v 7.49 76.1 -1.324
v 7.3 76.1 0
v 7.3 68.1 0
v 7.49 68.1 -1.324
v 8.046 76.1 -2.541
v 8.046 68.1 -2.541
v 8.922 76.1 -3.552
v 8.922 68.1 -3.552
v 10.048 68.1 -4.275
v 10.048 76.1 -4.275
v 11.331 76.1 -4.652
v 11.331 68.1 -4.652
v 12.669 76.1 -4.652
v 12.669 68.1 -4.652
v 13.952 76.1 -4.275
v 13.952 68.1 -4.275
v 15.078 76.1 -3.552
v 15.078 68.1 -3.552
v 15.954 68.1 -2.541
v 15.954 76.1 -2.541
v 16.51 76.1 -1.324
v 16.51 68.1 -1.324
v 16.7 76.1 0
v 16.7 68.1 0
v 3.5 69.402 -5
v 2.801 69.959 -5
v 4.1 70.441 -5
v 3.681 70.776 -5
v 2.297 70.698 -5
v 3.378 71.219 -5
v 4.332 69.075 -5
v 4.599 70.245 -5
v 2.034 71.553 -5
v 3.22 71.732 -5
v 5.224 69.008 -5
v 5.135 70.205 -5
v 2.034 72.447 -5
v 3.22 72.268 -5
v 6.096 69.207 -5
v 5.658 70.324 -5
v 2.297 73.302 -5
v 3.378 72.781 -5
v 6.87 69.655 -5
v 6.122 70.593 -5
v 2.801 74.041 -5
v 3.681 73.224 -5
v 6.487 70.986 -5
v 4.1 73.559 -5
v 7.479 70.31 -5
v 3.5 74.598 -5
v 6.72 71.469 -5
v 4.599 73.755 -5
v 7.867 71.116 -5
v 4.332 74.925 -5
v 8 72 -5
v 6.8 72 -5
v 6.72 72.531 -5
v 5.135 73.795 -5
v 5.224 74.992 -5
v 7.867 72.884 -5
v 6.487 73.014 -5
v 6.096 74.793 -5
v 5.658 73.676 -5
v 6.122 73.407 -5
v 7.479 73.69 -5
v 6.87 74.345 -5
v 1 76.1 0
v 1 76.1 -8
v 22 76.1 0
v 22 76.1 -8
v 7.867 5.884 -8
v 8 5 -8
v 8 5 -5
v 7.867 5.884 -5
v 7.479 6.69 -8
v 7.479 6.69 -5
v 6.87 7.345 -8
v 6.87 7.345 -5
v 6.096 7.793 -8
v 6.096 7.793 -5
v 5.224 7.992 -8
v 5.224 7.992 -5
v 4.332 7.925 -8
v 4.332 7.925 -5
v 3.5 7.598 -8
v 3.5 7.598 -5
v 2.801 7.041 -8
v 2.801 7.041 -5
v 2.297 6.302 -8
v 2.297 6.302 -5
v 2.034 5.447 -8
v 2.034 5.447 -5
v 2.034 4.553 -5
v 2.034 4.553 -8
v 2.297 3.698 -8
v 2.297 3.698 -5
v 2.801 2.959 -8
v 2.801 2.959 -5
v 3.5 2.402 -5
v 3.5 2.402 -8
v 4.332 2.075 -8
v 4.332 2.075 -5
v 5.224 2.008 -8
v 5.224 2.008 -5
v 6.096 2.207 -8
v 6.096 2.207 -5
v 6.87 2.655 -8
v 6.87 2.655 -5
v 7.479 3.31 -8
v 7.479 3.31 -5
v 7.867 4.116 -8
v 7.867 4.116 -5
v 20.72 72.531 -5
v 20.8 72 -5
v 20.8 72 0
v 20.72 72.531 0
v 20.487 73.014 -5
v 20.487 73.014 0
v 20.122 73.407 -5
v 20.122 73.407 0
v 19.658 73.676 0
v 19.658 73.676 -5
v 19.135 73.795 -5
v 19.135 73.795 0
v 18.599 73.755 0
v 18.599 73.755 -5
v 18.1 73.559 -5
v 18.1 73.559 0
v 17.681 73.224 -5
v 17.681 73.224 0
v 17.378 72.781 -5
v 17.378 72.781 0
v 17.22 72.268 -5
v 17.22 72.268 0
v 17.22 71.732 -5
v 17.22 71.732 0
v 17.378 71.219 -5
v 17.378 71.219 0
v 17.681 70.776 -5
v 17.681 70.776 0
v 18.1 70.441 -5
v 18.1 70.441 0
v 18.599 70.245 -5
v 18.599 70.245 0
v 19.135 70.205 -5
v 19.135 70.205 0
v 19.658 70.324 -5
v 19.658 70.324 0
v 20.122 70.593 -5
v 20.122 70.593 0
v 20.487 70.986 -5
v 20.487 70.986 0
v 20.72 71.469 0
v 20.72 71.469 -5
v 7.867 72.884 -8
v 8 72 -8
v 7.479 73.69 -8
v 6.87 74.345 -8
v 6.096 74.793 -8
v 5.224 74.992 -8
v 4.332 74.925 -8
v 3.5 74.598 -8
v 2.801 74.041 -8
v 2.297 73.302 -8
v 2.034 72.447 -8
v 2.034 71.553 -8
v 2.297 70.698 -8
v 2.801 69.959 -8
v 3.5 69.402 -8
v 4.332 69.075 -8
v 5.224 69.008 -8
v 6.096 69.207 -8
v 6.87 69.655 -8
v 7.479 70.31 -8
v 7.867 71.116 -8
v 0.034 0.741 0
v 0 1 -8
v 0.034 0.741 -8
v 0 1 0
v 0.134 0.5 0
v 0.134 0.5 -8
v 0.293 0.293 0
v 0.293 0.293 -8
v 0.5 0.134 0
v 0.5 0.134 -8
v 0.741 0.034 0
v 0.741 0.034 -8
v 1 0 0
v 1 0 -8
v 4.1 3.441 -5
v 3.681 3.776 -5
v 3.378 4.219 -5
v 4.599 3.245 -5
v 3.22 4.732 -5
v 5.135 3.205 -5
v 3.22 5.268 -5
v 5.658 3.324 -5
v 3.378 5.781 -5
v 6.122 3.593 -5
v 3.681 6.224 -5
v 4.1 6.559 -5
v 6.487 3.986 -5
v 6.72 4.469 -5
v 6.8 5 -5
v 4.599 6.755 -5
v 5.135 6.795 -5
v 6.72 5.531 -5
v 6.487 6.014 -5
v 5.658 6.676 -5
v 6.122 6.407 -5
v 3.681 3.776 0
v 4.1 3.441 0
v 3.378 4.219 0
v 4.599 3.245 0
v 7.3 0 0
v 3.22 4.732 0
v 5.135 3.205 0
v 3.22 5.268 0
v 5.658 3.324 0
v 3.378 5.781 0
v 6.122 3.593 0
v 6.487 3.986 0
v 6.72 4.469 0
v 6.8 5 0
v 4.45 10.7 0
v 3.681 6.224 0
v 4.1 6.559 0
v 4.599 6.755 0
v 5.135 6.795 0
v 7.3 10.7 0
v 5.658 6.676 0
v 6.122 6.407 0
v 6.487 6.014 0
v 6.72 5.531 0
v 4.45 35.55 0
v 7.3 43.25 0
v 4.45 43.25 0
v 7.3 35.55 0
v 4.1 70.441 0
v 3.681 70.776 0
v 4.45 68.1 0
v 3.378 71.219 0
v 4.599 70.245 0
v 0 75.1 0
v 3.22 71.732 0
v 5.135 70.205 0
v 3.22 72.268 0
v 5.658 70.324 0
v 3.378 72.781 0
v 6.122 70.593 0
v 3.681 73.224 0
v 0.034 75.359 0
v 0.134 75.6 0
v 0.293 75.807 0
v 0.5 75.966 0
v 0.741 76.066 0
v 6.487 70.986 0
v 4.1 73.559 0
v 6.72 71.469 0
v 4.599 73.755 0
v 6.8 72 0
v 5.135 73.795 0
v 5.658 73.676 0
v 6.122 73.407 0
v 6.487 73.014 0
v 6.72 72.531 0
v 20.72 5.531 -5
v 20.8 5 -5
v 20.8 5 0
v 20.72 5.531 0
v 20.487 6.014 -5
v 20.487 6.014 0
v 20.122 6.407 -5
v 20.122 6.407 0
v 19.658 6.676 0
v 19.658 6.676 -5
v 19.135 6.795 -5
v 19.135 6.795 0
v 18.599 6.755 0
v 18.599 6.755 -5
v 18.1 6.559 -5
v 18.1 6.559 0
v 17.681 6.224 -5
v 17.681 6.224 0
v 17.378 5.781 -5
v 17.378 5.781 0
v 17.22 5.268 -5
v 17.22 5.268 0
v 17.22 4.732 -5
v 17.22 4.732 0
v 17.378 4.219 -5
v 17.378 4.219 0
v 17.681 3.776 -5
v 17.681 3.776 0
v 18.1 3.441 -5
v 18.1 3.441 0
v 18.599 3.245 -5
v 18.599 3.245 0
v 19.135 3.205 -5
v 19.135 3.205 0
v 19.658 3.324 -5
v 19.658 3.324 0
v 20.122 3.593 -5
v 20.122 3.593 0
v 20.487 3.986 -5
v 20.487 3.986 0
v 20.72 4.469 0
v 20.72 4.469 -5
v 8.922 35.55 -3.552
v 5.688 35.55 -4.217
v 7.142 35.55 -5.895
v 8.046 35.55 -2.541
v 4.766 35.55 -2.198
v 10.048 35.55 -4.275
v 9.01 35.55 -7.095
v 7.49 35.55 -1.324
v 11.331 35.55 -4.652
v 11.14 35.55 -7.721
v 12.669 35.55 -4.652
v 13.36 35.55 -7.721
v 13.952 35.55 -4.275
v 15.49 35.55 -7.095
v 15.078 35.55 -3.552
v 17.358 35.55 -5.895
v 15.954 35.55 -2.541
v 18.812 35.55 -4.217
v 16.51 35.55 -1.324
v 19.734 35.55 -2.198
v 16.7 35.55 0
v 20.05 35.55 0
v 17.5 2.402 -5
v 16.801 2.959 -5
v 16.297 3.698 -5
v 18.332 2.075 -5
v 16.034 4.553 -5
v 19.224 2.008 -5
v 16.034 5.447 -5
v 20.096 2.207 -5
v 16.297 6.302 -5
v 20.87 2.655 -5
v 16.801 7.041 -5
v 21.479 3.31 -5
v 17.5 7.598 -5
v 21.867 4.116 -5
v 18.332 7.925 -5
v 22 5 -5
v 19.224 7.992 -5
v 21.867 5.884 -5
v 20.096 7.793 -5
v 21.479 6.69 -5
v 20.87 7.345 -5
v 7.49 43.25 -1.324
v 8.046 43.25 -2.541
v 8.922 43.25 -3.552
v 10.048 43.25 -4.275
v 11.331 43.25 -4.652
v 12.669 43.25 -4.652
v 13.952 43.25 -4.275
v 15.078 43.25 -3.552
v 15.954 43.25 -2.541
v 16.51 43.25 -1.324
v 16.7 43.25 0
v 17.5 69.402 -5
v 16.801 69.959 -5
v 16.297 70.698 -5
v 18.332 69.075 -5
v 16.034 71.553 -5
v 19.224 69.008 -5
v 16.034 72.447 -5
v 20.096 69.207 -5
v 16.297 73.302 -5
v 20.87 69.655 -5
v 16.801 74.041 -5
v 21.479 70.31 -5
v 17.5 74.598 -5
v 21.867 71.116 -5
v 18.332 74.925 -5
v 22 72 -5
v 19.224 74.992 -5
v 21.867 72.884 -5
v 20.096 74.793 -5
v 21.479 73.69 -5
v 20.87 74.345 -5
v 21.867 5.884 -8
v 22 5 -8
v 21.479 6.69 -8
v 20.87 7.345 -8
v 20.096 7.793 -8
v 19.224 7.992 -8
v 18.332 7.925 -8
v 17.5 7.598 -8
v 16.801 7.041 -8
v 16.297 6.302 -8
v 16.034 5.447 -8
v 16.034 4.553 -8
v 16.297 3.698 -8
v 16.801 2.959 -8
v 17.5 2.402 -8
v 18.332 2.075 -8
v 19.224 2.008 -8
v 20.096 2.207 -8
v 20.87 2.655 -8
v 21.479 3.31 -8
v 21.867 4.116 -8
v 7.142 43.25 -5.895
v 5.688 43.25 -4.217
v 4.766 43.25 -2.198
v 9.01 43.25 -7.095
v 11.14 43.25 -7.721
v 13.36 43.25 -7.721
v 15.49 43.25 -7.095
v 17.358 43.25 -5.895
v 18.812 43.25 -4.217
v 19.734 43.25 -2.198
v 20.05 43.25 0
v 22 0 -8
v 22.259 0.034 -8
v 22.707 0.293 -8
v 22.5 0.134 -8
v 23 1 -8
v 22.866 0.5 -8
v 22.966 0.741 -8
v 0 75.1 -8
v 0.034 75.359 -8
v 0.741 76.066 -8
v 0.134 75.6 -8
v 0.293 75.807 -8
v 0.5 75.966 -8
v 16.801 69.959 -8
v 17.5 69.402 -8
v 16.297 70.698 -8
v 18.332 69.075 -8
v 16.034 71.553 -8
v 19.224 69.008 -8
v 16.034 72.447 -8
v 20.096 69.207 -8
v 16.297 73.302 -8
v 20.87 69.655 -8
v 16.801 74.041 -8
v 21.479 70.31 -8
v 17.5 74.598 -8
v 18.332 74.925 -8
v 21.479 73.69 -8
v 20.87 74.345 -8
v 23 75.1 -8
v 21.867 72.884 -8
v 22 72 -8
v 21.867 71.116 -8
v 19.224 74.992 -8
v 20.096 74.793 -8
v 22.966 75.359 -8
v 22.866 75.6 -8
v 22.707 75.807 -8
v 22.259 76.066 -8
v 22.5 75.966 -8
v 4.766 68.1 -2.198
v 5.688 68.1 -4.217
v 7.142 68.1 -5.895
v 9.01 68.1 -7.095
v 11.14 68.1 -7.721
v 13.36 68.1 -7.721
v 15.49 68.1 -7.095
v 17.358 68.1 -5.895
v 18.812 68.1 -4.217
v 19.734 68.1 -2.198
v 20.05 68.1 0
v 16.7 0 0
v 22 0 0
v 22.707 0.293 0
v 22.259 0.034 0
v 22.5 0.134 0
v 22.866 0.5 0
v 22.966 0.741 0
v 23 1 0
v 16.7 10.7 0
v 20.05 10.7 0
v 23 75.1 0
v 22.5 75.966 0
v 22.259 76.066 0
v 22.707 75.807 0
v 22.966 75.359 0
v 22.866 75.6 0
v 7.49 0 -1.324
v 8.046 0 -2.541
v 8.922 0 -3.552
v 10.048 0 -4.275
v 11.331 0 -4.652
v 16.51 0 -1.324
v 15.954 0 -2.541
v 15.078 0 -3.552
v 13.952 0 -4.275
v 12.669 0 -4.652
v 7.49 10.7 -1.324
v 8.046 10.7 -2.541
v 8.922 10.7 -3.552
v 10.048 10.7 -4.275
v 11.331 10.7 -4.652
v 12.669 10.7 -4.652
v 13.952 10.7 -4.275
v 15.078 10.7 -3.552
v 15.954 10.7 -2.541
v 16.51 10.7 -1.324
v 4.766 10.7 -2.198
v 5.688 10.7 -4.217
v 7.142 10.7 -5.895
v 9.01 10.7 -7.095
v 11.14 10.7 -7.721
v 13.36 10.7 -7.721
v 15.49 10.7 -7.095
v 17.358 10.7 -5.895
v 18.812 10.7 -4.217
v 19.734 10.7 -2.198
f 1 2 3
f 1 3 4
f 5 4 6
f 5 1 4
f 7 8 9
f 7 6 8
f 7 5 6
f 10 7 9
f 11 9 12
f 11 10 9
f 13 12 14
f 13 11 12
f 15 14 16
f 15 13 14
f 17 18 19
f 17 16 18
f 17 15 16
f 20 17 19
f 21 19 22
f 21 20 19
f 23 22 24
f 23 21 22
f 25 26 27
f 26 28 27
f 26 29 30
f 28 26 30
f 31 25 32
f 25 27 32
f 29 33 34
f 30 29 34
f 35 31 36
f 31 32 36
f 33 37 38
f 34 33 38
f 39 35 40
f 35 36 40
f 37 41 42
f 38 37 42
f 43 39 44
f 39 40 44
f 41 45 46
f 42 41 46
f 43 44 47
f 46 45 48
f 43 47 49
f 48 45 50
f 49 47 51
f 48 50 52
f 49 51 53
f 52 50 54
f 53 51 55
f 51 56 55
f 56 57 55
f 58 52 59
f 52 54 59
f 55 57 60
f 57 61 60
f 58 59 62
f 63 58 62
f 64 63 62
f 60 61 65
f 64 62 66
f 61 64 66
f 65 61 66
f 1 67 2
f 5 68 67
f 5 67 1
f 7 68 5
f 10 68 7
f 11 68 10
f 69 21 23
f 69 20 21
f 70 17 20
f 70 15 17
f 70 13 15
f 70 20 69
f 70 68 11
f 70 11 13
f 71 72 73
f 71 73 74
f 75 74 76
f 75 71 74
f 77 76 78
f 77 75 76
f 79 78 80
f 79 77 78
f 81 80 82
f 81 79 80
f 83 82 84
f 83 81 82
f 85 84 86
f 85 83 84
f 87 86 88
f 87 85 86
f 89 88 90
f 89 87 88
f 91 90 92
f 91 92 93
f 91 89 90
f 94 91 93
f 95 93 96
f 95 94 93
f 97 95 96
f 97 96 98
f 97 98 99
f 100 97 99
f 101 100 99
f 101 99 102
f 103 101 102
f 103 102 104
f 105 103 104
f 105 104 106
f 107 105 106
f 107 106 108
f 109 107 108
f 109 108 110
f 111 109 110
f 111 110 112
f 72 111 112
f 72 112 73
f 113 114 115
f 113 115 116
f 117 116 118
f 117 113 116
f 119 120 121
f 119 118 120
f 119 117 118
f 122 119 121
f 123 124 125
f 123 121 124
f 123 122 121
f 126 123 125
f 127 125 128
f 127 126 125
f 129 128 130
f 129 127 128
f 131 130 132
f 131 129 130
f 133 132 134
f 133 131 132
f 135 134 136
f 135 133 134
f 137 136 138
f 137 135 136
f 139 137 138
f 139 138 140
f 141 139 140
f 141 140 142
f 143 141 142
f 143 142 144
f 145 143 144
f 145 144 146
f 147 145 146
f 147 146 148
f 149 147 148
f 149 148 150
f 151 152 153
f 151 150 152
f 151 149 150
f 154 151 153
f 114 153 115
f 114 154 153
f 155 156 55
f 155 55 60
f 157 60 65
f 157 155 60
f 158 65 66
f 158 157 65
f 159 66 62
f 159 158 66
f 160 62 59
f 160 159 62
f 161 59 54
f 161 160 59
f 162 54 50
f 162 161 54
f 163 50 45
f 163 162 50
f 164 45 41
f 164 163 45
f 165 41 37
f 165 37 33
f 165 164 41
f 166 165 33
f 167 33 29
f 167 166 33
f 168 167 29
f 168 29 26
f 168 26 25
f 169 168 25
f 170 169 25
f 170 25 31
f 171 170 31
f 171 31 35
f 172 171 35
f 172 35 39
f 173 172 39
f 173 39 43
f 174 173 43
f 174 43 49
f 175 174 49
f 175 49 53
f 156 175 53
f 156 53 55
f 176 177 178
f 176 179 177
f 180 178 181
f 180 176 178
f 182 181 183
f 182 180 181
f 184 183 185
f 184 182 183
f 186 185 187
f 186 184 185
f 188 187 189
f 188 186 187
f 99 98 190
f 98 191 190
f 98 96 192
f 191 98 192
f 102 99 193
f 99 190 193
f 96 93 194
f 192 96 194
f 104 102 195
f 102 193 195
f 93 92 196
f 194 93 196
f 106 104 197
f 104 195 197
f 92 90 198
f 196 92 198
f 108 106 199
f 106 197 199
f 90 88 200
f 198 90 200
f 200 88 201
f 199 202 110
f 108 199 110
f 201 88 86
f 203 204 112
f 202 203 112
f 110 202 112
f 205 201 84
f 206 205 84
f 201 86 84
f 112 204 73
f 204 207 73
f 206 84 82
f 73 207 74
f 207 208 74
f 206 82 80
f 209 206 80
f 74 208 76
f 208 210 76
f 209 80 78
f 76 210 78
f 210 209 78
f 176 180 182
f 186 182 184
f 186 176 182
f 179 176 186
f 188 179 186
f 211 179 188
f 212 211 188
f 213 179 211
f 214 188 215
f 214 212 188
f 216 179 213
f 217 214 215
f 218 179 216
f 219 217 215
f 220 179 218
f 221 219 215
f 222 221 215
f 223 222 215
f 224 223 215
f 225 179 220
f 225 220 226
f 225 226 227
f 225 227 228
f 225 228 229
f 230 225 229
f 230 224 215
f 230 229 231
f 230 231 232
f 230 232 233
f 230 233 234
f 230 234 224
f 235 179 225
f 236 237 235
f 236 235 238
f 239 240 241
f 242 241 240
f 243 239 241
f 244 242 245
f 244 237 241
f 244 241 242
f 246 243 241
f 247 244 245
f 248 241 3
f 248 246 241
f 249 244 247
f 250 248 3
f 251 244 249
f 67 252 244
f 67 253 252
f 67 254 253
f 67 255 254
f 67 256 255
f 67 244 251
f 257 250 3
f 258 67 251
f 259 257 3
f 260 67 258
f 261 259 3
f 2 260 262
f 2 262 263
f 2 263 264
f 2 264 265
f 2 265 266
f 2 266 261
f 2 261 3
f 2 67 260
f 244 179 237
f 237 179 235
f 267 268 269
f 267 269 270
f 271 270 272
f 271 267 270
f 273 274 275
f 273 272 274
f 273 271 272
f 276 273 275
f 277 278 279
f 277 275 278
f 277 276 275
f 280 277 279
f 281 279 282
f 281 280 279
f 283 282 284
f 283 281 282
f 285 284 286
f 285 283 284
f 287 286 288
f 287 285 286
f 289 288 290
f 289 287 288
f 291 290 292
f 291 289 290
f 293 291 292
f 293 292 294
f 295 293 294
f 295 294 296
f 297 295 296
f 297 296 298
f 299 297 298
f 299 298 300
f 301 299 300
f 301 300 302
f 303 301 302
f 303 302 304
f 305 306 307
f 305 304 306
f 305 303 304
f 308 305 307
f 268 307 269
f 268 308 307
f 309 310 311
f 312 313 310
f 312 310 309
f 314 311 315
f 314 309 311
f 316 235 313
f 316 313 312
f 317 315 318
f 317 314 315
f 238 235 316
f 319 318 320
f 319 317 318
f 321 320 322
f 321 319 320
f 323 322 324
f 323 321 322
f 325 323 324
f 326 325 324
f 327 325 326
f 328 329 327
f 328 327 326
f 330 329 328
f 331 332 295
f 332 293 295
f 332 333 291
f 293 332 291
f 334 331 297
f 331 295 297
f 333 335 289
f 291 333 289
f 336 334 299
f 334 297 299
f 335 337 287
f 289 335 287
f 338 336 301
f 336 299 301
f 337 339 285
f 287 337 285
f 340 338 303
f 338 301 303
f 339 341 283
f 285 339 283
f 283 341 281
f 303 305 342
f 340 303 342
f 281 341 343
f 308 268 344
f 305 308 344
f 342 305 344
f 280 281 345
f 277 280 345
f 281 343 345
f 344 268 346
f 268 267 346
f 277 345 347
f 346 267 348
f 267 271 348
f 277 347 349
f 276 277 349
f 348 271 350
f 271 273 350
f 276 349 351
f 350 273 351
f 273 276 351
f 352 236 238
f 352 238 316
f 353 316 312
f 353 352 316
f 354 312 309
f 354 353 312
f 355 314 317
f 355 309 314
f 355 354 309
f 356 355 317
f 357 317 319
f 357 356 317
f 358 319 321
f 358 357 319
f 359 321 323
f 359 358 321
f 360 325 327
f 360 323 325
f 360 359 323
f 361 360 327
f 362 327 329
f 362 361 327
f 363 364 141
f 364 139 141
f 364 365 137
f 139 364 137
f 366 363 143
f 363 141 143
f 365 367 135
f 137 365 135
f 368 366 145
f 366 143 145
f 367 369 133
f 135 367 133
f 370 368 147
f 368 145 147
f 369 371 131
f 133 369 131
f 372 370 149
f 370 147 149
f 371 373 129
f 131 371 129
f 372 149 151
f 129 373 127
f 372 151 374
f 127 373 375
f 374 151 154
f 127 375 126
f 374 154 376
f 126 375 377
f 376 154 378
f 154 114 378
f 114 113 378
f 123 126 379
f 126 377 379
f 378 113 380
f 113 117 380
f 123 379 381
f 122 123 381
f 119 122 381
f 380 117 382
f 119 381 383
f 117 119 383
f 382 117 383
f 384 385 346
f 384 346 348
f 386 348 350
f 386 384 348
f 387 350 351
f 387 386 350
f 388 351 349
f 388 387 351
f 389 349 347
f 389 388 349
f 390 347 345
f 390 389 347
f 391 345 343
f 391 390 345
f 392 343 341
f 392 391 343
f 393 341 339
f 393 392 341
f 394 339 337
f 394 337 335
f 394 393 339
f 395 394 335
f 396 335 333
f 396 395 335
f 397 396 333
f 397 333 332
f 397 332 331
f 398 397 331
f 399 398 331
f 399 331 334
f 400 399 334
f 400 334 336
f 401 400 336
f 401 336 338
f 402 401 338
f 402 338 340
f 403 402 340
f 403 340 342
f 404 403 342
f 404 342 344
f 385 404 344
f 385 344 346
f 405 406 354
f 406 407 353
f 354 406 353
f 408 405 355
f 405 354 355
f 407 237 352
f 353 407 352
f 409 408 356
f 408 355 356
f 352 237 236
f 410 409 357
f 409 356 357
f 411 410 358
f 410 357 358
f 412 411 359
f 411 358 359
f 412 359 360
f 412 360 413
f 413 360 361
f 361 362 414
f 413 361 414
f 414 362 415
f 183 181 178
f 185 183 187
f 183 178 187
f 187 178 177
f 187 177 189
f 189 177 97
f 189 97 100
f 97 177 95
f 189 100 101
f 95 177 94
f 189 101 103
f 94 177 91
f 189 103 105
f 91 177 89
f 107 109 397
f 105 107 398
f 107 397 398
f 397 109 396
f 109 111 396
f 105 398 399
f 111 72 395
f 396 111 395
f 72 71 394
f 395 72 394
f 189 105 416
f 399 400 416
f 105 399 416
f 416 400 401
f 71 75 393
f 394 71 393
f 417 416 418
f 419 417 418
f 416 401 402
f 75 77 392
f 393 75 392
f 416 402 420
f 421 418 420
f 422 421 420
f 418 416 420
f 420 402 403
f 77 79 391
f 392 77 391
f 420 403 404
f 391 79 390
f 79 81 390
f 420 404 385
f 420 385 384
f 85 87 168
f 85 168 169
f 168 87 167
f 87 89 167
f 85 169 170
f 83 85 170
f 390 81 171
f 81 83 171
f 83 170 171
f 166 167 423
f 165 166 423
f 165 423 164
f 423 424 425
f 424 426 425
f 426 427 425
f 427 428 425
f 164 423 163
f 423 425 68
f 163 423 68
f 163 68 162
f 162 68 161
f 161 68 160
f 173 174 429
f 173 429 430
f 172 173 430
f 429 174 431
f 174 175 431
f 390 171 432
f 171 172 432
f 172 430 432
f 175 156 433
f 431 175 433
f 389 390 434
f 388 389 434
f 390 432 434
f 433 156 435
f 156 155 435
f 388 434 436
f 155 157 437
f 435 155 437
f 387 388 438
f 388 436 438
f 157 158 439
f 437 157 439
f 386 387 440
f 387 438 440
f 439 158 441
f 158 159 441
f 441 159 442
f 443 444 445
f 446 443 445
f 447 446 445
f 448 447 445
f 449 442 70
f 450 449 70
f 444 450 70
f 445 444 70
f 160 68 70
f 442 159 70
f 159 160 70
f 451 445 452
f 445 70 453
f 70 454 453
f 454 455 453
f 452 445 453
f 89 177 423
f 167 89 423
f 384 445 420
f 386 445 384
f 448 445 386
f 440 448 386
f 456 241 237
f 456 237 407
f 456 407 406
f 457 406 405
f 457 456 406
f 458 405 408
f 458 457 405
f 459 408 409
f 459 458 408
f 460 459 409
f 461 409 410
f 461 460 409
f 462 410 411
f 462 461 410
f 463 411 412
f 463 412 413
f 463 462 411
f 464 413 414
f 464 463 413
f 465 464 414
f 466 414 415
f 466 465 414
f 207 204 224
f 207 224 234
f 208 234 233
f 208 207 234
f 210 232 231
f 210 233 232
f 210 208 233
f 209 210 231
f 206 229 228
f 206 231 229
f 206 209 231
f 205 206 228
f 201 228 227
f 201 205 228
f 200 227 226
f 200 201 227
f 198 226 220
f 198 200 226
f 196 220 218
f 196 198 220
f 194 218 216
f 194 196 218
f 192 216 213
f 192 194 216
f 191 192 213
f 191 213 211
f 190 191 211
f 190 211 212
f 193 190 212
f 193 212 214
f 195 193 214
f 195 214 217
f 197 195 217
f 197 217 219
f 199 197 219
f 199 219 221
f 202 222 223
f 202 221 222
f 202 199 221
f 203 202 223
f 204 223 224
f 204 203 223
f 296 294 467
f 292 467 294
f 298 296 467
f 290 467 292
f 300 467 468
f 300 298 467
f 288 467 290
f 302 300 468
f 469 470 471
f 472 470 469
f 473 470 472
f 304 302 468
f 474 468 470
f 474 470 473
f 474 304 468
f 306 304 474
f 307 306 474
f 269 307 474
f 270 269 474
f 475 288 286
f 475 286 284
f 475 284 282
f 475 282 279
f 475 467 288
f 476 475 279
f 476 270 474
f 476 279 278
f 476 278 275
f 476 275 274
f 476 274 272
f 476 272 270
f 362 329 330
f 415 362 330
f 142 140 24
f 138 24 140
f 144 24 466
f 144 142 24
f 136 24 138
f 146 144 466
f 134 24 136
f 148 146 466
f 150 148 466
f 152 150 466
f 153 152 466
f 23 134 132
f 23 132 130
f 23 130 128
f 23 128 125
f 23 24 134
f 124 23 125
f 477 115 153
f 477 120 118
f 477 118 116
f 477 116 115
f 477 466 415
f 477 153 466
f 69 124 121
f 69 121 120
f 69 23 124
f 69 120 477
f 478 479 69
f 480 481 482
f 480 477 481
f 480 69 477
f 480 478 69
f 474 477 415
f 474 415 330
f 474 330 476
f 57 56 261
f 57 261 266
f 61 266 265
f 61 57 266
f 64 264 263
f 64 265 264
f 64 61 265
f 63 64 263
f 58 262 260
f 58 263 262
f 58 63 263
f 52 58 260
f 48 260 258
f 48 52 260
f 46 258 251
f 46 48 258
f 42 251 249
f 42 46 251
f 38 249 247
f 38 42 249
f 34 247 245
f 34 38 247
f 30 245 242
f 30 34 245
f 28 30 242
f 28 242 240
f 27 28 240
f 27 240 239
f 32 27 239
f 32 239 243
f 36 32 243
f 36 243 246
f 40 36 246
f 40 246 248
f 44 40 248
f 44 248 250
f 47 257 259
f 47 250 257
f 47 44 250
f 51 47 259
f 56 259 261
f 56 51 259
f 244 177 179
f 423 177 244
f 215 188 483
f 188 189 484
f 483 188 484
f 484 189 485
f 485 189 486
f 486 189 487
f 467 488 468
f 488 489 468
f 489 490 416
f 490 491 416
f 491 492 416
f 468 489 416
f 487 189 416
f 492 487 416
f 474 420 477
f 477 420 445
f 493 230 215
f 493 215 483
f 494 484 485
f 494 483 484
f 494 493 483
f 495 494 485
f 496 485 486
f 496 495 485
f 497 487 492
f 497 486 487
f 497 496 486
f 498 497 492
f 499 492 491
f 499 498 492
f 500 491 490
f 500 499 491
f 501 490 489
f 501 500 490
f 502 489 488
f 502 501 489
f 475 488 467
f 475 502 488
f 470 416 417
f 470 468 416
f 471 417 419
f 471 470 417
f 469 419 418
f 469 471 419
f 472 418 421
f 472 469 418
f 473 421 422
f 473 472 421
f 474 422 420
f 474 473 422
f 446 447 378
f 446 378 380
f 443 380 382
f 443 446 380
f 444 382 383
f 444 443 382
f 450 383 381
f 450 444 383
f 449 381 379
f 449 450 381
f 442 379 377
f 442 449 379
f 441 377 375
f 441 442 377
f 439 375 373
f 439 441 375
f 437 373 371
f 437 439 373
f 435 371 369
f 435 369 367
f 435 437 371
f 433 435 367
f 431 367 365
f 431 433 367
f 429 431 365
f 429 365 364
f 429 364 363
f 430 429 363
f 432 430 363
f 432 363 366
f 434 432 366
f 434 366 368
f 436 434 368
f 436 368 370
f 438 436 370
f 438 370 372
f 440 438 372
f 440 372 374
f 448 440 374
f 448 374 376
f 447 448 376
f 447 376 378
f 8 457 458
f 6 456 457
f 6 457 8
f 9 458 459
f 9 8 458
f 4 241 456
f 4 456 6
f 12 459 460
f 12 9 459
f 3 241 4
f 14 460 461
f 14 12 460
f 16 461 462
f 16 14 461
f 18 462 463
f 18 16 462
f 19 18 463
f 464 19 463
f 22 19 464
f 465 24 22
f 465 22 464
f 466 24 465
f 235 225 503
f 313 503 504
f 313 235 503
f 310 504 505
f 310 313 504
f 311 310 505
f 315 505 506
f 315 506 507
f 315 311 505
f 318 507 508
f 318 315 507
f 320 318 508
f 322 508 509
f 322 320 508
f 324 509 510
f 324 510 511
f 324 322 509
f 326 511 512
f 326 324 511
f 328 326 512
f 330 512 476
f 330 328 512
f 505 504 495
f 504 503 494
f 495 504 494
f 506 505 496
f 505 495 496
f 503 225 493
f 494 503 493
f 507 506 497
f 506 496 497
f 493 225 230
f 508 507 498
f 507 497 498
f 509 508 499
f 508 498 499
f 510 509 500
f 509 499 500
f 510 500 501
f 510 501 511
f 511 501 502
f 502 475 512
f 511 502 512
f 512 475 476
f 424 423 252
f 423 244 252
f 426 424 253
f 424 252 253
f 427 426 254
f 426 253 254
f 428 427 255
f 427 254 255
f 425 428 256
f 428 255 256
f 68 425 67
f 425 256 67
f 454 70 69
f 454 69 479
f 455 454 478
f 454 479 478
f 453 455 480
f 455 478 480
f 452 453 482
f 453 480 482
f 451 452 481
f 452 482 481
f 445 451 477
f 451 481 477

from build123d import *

# Parameters (mm, degrees)
CYLINDER048_R          = 4.7
CYLINDER048_DEPTH      = 100
CYLINDER048_ROLL_ANGLE = 90
CYLINDER045_R          = 1.8
CYLINDER045_DEPTH      = 20
CYLINDER044_R          = 3
CYLINDER044_DEPTH      = 10
CYLINDER042_R          = 1.8
CYLINDER042_DEPTH      = 20
CYLINDER041_R          = 3
CYLINDER041_DEPTH      = 10
CYLINDER034_R          = 3
CYLINDER034_DEPTH      = 10
CYLINDER033_R          = 3
CYLINDER033_DEPTH      = 10
CYLINDER031_R          = 1.8
CYLINDER031_DEPTH      = 20
CYLINDER032_R          = 1.8
CYLINDER032_DEPTH      = 20
CYLINDER029_R          = 7.8
CYLINDER029_DEPTH      = 24.85
CYLINDER029_ROLL_ANGLE = 90
CYLINDER030_R          = 4.4
CYLINDER030_DEPTH      = 76.1
CYLINDER030_ROLL_ANGLE = 90
CYLINDER028_R          = 7.8
CYLINDER028_DEPTH      = 24.85
CYLINDER028_ROLL_ANGLE = 90
BOX011_W               = 23
BOX011_H               = 76.1
BOX011_DEPTH           = 8
FILLET003002_R         = 1


with BuildPart() as cylinder048:
    # Cylinder048 → Cylinder048 (new body)
    with BuildSketch(Plane.XY):
        Circle(CYLINDER048_R)
    extrude(amount=CYLINDER048_DEPTH)


with BuildPart() as cylinder048_1:
    # Cylinder048 roll: moved
    add(cylinder048.part.rotate(Axis((0, 0, 0), (1, 0, 0)), CYLINDER048_ROLL_ANGLE))


with BuildPart() as cylinder048_2:
    # Cylinder048 placement: moved
    add(cylinder048_1.part.moved(Location((12, 79, 0))))


with BuildPart() as cilindro030:
    # Cylinder045 → Cylinder045 (new body)
    with BuildSketch(Plane(origin=(19, 5, -10), x_dir=(1, 0, 0), z_dir=(0, 0, 1))):
        Circle(CYLINDER045_R)
    extrude(amount=CYLINDER045_DEPTH)


with BuildPart() as cilindro029:
    # Cylinder044 → Cylinder044 (new body)
    with BuildSketch(Plane(origin=(19, 5, -15), x_dir=(1, 0, 0), z_dir=(0, 0, 1))):
        Circle(CYLINDER044_R)
    extrude(amount=CYLINDER044_DEPTH)


with BuildPart() as cilindro027:
    # Cylinder042 → Cylinder042 (new body)
    with BuildSketch(Plane(origin=(19, 72, -10), x_dir=(1, 0, 0), z_dir=(0, 0, 1))):
        Circle(CYLINDER042_R)
    extrude(amount=CYLINDER042_DEPTH)


with BuildPart() as cilindro026:
    # Cylinder041 → Cylinder041 (new body)
    with BuildSketch(Plane(origin=(19, 72, -15), x_dir=(1, 0, 0), z_dir=(0, 0, 1))):
        Circle(CYLINDER041_R)
    extrude(amount=CYLINDER041_DEPTH)


with BuildPart() as cilindro019:
    # Cylinder034 → Cylinder034 (new body)
    with BuildSketch(Plane(origin=(5, 72, -15), x_dir=(1, 0, 0), z_dir=(0, 0, 1))):
        Circle(CYLINDER034_R)
    extrude(amount=CYLINDER034_DEPTH)


with BuildPart() as cilindro018:
    # Cylinder033 → Cylinder033 (new body)
    with BuildSketch(Plane(origin=(5, 5, -15), x_dir=(1, 0, 0), z_dir=(0, 0, 1))):
        Circle(CYLINDER033_R)
    extrude(amount=CYLINDER033_DEPTH)


with BuildPart() as cilindro016:
    # Cylinder031 → Cylinder031 (new body)
    with BuildSketch(Plane(origin=(5, 5, -10), x_dir=(1, 0, 0), z_dir=(0, 0, 1))):
        Circle(CYLINDER031_R)
    extrude(amount=CYLINDER031_DEPTH)


with BuildPart() as cilindro017:
    # Cylinder032 → Cylinder032 (new body)
    with BuildSketch(Plane(origin=(5, 72, -10), x_dir=(1, 0, 0), z_dir=(0, 0, 1))):
        Circle(CYLINDER032_R)
    extrude(amount=CYLINDER032_DEPTH)


with BuildPart() as cylinder029:
    # Cylinder029 → Cylinder029 (new body)
    with BuildSketch(Plane.XY):
        Circle(CYLINDER029_R)
    extrude(amount=CYLINDER029_DEPTH)


with BuildPart() as cylinder029_1:
    # Cylinder029 roll: moved
    add(cylinder029.part.rotate(Axis((0, 0, 0), (1, 0, 0)), CYLINDER029_ROLL_ANGLE))


with BuildPart() as cylinder029_2:
    # Cylinder029 placement: moved
    add(cylinder029_1.part.moved(Location((12.25, 68.1, 0))))


with BuildPart() as cylinder030:
    # Cylinder030 → Cylinder030 (new body)
    with BuildSketch(Plane.XY):
        Circle(CYLINDER030_R)
    extrude(amount=CYLINDER030_DEPTH)


with BuildPart() as cylinder030_1:
    # Cylinder030 roll: moved
    add(cylinder030.part.rotate(Axis((0, 0, 0), (1, 0, 0)), CYLINDER030_ROLL_ANGLE))


with BuildPart() as cylinder030_2:
    # Cylinder030 placement: moved
    add(cylinder030_1.part.moved(Location((12.25, 76.1, 0))))


with BuildPart() as cylinder028:
    # Cylinder028 → Cylinder028 (new body)
    with BuildSketch(Plane.XY):
        Circle(CYLINDER028_R)
    extrude(amount=CYLINDER028_DEPTH)


with BuildPart() as cylinder028_1:
    # Cylinder028 roll: moved
    add(cylinder028.part.rotate(Axis((0, 0, 0), (1, 0, 0)), CYLINDER028_ROLL_ANGLE))


with BuildPart() as cylinder028_2:
    # Cylinder028 placement: moved
    add(cylinder028_1.part.moved(Location((12.25, 35.55, 0))))


with BuildPart() as carcasa_2_vi:
    # Box011 → Box011 (new body)
    with BuildSketch(Plane.XY.offset(-8)):
        with Locations((11.5, 38.05)):
            Rectangle(BOX011_W, BOX011_H)
    extrude(amount=BOX011_DEPTH)

    # Cut010035003006: cut Cylinder028
    add(cylinder028_2.part, mode=Mode.SUBTRACT)

    # Cut010035003007: cut Cylinder030
    add(cylinder030_2.part, mode=Mode.SUBTRACT)

    # Cut010035003008: cut Cylinder029
    add(cylinder029_2.part, mode=Mode.SUBTRACT)

    # Cut010035003009: cut Cilindro017
    add(cilindro017.part, mode=Mode.SUBTRACT)

    # Cut010035003010: cut Cilindro016
    add(cilindro016.part, mode=Mode.SUBTRACT)

    # Fillet003002
    fillet003002_edges = [carcasa_2_vi.edges().sort_by_distance(p)[0] for p in [
        (0, 0, -4),
        (0, 76.1, -4),
        (23, 0, -4),
        (23, 76.1, -4),
    ]]
    fillet(fillet003002_edges, radius=FILLET003002_R)

    # Cut010035003011: cut Cilindro018
    add(cilindro018.part, mode=Mode.SUBTRACT)

    # Cut010035003012: cut Cilindro019
    add(cilindro019.part, mode=Mode.SUBTRACT)

    # Cut010035003022: cut Cilindro026
    add(cilindro026.part, mode=Mode.SUBTRACT)

    # Cut010035003023: cut Cilindro027
    add(cilindro027.part, mode=Mode.SUBTRACT)

    # Cut010035003026: cut Cilindro029
    add(cilindro029.part, mode=Mode.SUBTRACT)

    # Cut010035003027: cut Cilindro030
    add(cilindro030.part, mode=Mode.SUBTRACT)

    # Cut010035003032: cut Cylinder048
    add(cylinder048_2.part, mode=Mode.SUBTRACT)


solid = carcasa_2_vi.part
